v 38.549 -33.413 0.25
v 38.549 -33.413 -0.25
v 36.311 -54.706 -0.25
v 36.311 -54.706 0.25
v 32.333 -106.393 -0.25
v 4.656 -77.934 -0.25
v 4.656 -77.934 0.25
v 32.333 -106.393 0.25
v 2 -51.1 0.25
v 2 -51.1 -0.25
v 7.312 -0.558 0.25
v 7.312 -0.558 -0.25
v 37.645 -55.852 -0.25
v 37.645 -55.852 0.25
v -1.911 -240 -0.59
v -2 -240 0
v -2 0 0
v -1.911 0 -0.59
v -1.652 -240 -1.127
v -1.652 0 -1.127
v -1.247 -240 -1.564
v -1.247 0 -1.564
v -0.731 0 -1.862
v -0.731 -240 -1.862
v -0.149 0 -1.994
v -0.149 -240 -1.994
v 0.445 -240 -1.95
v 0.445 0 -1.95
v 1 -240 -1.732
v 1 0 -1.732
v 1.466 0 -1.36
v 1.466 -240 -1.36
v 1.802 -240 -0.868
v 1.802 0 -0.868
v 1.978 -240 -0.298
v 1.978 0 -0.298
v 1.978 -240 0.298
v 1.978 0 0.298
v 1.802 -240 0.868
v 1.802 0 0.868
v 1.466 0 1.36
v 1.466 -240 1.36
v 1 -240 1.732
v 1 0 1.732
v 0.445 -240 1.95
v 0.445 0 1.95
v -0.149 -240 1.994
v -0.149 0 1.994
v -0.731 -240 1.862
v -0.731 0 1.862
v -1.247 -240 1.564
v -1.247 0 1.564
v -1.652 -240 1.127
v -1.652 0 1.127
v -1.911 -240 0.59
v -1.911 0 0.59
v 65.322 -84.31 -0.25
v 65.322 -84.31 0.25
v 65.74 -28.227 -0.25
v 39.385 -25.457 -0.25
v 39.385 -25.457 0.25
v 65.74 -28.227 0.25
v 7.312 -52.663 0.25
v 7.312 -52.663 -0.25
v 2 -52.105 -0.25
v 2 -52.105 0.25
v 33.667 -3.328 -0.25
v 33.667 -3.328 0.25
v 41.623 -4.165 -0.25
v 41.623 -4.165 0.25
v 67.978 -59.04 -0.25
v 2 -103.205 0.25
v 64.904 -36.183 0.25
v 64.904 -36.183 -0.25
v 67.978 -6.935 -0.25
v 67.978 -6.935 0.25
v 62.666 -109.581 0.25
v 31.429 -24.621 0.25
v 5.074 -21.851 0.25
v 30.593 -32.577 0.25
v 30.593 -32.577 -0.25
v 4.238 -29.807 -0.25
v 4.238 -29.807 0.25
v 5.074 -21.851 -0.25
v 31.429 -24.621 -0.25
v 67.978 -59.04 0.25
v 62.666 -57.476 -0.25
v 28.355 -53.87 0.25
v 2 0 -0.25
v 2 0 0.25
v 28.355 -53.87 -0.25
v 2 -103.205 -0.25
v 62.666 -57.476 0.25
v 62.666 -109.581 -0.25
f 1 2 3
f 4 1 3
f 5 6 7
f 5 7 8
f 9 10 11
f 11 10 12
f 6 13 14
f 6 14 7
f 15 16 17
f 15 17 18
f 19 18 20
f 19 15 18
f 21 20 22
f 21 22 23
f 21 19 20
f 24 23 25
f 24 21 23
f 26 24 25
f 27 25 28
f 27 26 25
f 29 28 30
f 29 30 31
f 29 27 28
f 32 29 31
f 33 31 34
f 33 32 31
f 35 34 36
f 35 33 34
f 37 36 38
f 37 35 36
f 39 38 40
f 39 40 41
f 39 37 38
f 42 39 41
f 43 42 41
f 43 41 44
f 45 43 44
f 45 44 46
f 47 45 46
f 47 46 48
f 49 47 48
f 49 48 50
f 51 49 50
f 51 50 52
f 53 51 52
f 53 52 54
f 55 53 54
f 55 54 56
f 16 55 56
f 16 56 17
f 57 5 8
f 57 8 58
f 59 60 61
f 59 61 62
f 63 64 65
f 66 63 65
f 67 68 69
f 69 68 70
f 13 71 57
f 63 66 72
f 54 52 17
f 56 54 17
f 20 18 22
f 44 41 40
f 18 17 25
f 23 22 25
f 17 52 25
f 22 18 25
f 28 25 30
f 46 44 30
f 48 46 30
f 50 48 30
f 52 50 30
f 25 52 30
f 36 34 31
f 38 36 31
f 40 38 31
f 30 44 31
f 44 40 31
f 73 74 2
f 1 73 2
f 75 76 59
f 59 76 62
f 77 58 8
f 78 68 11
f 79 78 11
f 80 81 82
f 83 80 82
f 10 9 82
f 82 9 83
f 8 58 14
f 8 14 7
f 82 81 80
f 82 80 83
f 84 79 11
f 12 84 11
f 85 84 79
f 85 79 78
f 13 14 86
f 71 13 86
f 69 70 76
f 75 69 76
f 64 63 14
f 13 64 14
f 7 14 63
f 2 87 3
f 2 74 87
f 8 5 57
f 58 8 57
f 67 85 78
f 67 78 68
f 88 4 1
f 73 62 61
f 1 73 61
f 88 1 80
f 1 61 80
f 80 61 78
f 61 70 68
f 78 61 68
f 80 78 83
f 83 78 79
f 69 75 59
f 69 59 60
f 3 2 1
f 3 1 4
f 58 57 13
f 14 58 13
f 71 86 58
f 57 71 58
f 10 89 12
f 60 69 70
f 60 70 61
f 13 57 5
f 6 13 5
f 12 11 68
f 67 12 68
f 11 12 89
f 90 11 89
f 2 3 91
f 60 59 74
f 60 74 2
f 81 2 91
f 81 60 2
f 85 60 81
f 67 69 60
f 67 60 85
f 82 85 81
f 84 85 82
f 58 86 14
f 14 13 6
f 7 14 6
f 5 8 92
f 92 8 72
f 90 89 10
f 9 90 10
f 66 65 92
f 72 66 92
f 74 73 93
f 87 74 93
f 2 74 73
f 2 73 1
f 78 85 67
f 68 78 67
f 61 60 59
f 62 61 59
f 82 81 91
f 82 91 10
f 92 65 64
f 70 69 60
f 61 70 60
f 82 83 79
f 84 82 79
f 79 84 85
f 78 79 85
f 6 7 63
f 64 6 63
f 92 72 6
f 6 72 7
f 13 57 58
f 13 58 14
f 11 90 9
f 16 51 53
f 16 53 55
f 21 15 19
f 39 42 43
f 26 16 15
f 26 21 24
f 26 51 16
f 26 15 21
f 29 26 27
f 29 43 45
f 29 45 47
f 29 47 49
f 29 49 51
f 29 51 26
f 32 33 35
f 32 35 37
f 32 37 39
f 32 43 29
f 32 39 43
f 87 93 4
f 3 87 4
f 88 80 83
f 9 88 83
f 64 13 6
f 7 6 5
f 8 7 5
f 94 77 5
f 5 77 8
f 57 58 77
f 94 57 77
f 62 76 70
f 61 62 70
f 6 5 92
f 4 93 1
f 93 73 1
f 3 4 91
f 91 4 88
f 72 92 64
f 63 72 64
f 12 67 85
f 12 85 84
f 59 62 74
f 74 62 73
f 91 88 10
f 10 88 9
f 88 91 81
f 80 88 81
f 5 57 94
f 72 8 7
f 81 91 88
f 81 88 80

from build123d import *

# Parameters (mm, degrees)
BOSS_EXTRU_2_DEPTH             = 0.25
BOSS_EXTRU_2_2_DEPTH           = 0.25
FRACTIONNER1_START             = -0.25
FRACTIONNER1_DEPTH             = 0.5
FRACTIONNER1_2_DEPTH           = 0.5
FRACTIONNER1_START_2           = 7.435510802
FRACTIONNER1_3_OUTLINE_W       = 54
FRACTIONNER1_3_OUTLINE_H       = 4
FRACTIONNER1_3_DEPTH           = 5.341362776
FRACTIONNER1_START_3           = 1.989043791
FRACTIONNER1_4_OUTLINE_W       = 54
FRACTIONNER1_4_OUTLINE_H       = 4
FRACTIONNER1_4_DEPTH           = 5.341362776
FRACTIONNER2_SURFACE_1_1_BACK  = 128.911
FRACTIONNER2_SURFACE_1_1_DEPTH = 257.822
FRACTIONNER2_SURFACE_1_2_BACK  = 128.911
FRACTIONNER2_SURFACE_1_2_DEPTH = 257.822
FRACTIONNER2_SURFACE_2_3_BACK  = 128.911
FRACTIONNER2_SURFACE_2_3_DEPTH = 257.822
FRACTIONNER2_SURFACE_2_4_BACK  = 128.911
FRACTIONNER2_SURFACE_2_4_DEPTH = 257.822
FRACTIONNER2_SURFACE_3_5_BACK  = 128.911
FRACTIONNER2_SURFACE_3_5_DEPTH = 257.822
FRACTIONNER2_SURFACE_3_6_BACK  = 128.911
FRACTIONNER2_SURFACE_3_6_DEPTH = 257.822
FRACTIONNER2_SURFACE_4_7_BACK  = 128.911
FRACTIONNER2_SURFACE_4_7_DEPTH = 257.822
FRACTIONNER2_SURFACE_4_8_BACK  = 128.911
FRACTIONNER2_SURFACE_4_8_DEPTH = 257.822
FRACTIONNER3_SURFACE_9_BACK    = 128.911
FRACTIONNER3_SURFACE_9_DEPTH   = 257.822
FRACTIONNER3_SURFACE_10_BACK   = 128.911
FRACTIONNER3_SURFACE_10_DEPTH  = 257.822
BALAYAGE2_PROFILE_R            = 2


# Read off the part's stored shape, not the designer's step: Fractionner1
with BuildPart() as part:
    # Esquisse2 → Boss.-Extru.2 (new, symmetric)
    with BuildSketch(Plane.XY):
        Polygon((2, 0), (67.977937849, -6.934560702), (62.665835617, -57.475837352), (2, -51.099601093), align=None)
    extrude(amount=BOSS_EXTRU_2_DEPTH, both=True)

    # Fractionner1 4 outline → Fractionner1 4 (cut)
    with BuildSketch(Plane(origin=(0, 0, 0), x_dir=(0.10452846326764997, 0.9945218953682736, 0), z_dir=(0.9945218953682737, -0.10452846326764997, 0)).offset(FRACTIONNER1_START_3)):
        with Locations((-25, 0)):
            Rectangle(FRACTIONNER1_4_OUTLINE_W, FRACTIONNER1_4_OUTLINE_H)
    extrude(amount=FRACTIONNER1_4_DEPTH, mode=Mode.SUBTRACT)


with BuildPart() as body_2:
    # Esquisse2 → Boss.-Extru.2 2 (new, symmetric)
    with BuildSketch(Plane.XY):
        Polygon((2, -52.105109372), (67.977937849, -59.039670074), (62.665835617, -109.580946724), (2, -103.204710465), align=None)
    extrude(amount=BOSS_EXTRU_2_2_DEPTH, both=True)

    # Fractionner1 3 outline → Fractionner1 3 (cut)
    with BuildSketch(Plane(origin=(0, 0, 0), x_dir=(0.10452846326764997, 0.9945218953682736, 0), z_dir=(0.9945218953682737, -0.10452846326764997, 0)).offset(FRACTIONNER1_START_2)):
        with Locations((-77, 0)):
            Rectangle(FRACTIONNER1_3_OUTLINE_W, FRACTIONNER1_3_OUTLINE_H)
    extrude(amount=FRACTIONNER1_3_DEPTH, mode=Mode.SUBTRACT)


with BuildPart() as body_3:
    # Fractionner1 outline → Fractionner1 (new body)
    with BuildSketch(Plane.XY.offset(FRACTIONNER1_START)):
        Polygon((2, -51.099601093), (7.312102232, -0.558324443), (2, 0), align=None)
    extrude(amount=FRACTIONNER1_DEPTH)


with BuildPart() as body_4:
    # Fractionner1 2 outline → Fractionner1 2 (new body)
    with BuildSketch(Plane.XY.offset(FRACTIONNER1_START)):
        Polygon((2, -103.204710465), (7.312102232, -52.663433815), (2, -52.105109372), align=None)
    extrude(amount=FRACTIONNER1_2_DEPTH)


with BuildPart() as body_5:
    # Fractionner2: the piece behind the surface
    add(part.part)
    # Fractionner2 surface 1: a surface, the sketch's curves swept straight by 257.822 mm
    with BuildLine(Plane.XY.offset(0.25).offset(-FRACTIONNER2_SURFACE_1_1_BACK), mode=Mode.PRIVATE) as fractionner2_surface_1_1_path:
        Line((5.074164969, -21.850875186), (31.428995196, -24.620879463))
        Line((31.428995196, -24.620879463), (33.666932459, -3.328328719))
    fractionner2_surface_1_1 = Shell.extrude(fractionner2_surface_1_1_path.wire(), (0 * FRACTIONNER2_SURFACE_1_1_DEPTH, 0 * FRACTIONNER2_SURFACE_1_1_DEPTH, 1 * FRACTIONNER2_SURFACE_1_1_DEPTH))
    split(bisect_by=fractionner2_surface_1_1, keep=Keep.BOTTOM)


with BuildPart() as part_1:
    add(part.part)

    # Fractionner2: split by a surface, the side it looks to stays
    # Fractionner2 surface 1: a surface, the sketch's curves swept straight by 257.822 mm
    with BuildLine(Plane.XY.offset(0.25).offset(-FRACTIONNER2_SURFACE_1_2_BACK), mode=Mode.PRIVATE) as fractionner2_surface_1_2_path:
        Line((5.074164969, -21.850875186), (31.428995196, -24.620879463))
        Line((31.428995196, -24.620879463), (33.666932459, -3.328328719))
    fractionner2_surface_1_2 = Shell.extrude(fractionner2_surface_1_2_path.wire(), (0 * FRACTIONNER2_SURFACE_1_2_DEPTH, 0 * FRACTIONNER2_SURFACE_1_2_DEPTH, 1 * FRACTIONNER2_SURFACE_1_2_DEPTH))
    split(bisect_by=fractionner2_surface_1_2, keep=Keep.TOP)


with BuildPart() as body_6:
    # Fractionner2 2 body 5: the piece behind the surface
    add(body_5.part)
    # Fractionner2 surface 2: a surface, the sketch's curves swept straight by 257.822 mm
    with BuildLine(Plane.XY.offset(0.25).offset(-FRACTIONNER2_SURFACE_2_3_BACK), mode=Mode.PRIVATE) as fractionner2_surface_2_3_path:
        Line((41.623107622, -4.164556425), (39.385170359, -25.457107169))
        Line((39.385170359, -25.457107169), (65.740000586, -28.227111445))
    fractionner2_surface_2_3 = Shell.extrude(fractionner2_surface_2_3_path.wire(), (0 * FRACTIONNER2_SURFACE_2_3_DEPTH, 0 * FRACTIONNER2_SURFACE_2_3_DEPTH, 1 * FRACTIONNER2_SURFACE_2_3_DEPTH))
    split(bisect_by=fractionner2_surface_2_3, keep=Keep.BOTTOM)


with BuildPart() as body_5_1:
    add(body_5.part)

    # Fractionner2 2 body 5: split by a surface, the side it looks to stays
    # Fractionner2 surface 2: a surface, the sketch's curves swept straight by 257.822 mm
    with BuildLine(Plane.XY.offset(0.25).offset(-FRACTIONNER2_SURFACE_2_4_BACK), mode=Mode.PRIVATE) as fractionner2_surface_2_4_path:
        Line((41.623107622, -4.164556425), (39.385170359, -25.457107169))
        Line((39.385170359, -25.457107169), (65.740000586, -28.227111445))
    fractionner2_surface_2_4 = Shell.extrude(fractionner2_surface_2_4_path.wire(), (0 * FRACTIONNER2_SURFACE_2_4_DEPTH, 0 * FRACTIONNER2_SURFACE_2_4_DEPTH, 1 * FRACTIONNER2_SURFACE_2_4_DEPTH))
    split(bisect_by=fractionner2_surface_2_4, keep=Keep.TOP)


with BuildPart() as body_7:
    # Fractionner2 3 body 6: the piece behind the surface
    add(body_6.part)
    # Fractionner2 surface 3: a surface, the sketch's curves swept straight by 257.822 mm
    with BuildLine(Plane.XY.offset(0.25).offset(-FRACTIONNER2_SURFACE_3_5_BACK), mode=Mode.PRIVATE) as fractionner2_surface_3_5_path:
        Line((64.90377288, -36.183286608), (38.548942653, -33.413282332))
        Line((38.548942653, -33.413282332), (36.31100539, -54.705833075))
    fractionner2_surface_3_5 = Shell.extrude(fractionner2_surface_3_5_path.wire(), (0 * FRACTIONNER2_SURFACE_3_5_DEPTH, 0 * FRACTIONNER2_SURFACE_3_5_DEPTH, 1 * FRACTIONNER2_SURFACE_3_5_DEPTH))
    split(bisect_by=fractionner2_surface_3_5, keep=Keep.BOTTOM)


with BuildPart() as body_6_1:
    add(body_6.part)

    # Fractionner2 3 body 6: split by a surface, the side it looks to stays
    # Fractionner2 surface 3: a surface, the sketch's curves swept straight by 257.822 mm
    with BuildLine(Plane.XY.offset(0.25).offset(-FRACTIONNER2_SURFACE_3_6_BACK), mode=Mode.PRIVATE) as fractionner2_surface_3_6_path:
        Line((64.90377288, -36.183286608), (38.548942653, -33.413282332))
        Line((38.548942653, -33.413282332), (36.31100539, -54.705833075))
    fractionner2_surface_3_6 = Shell.extrude(fractionner2_surface_3_6_path.wire(), (0 * FRACTIONNER2_SURFACE_3_6_DEPTH, 0 * FRACTIONNER2_SURFACE_3_6_DEPTH, 1 * FRACTIONNER2_SURFACE_3_6_DEPTH))
    split(bisect_by=fractionner2_surface_3_6, keep=Keep.TOP)


with BuildPart() as body_8:
    # Fractionner2 4 body 7: the piece behind the surface
    add(body_7.part)
    # Fractionner2 surface 4: a surface, the sketch's curves swept straight by 257.822 mm
    with BuildLine(Plane.XY.offset(0.25).offset(-FRACTIONNER2_SURFACE_4_7_BACK), mode=Mode.PRIVATE) as fractionner2_surface_4_7_path:
        Line((28.354830227, -53.869605369), (30.59276749, -32.577054626))
        Line((30.59276749, -32.577054626), (4.237937263, -29.807050349))
    fractionner2_surface_4_7 = Shell.extrude(fractionner2_surface_4_7_path.wire(), (0 * FRACTIONNER2_SURFACE_4_7_DEPTH, 0 * FRACTIONNER2_SURFACE_4_7_DEPTH, 1 * FRACTIONNER2_SURFACE_4_7_DEPTH))
    split(bisect_by=fractionner2_surface_4_7, keep=Keep.BOTTOM)


with BuildPart() as body_7_1:
    add(body_7.part)

    # Fractionner2 4 body 7: split by a surface, the side it looks to stays
    # Fractionner2 surface 4: a surface, the sketch's curves swept straight by 257.822 mm
    with BuildLine(Plane.XY.offset(0.25).offset(-FRACTIONNER2_SURFACE_4_8_BACK), mode=Mode.PRIVATE) as fractionner2_surface_4_8_path:
        Line((28.354830227, -53.869605369), (30.59276749, -32.577054626))
        Line((30.59276749, -32.577054626), (4.237937263, -29.807050349))
    fractionner2_surface_4_8 = Shell.extrude(fractionner2_surface_4_8_path.wire(), (0 * FRACTIONNER2_SURFACE_4_8_DEPTH, 0 * FRACTIONNER2_SURFACE_4_8_DEPTH, 1 * FRACTIONNER2_SURFACE_4_8_DEPTH))
    split(bisect_by=fractionner2_surface_4_8, keep=Keep.TOP)


with BuildPart() as body_9:
    # Fractionner3: the piece behind the surface
    add(body_2.part)
    # Fractionner3 surface: a surface, the sketch's curves swept straight by 257.822 mm
    with BuildLine(Plane.XY.offset(0.25).offset(-FRACTIONNER3_SURFACE_9_BACK), mode=Mode.PRIVATE) as fractionner3_surface_9_path:
        Line((37.64502004, -55.851551945), (4.656051116, -77.93407214))
        Line((4.656051116, -77.93407214), (32.332917809, -106.392828594))
        Line((32.332917809, -106.392828594), (65.321886733, -84.310308399))
        Line((65.321886733, -84.310308399), (37.64502004, -55.851551945))
    fractionner3_surface_9 = Shell.extrude(fractionner3_surface_9_path.wire(), (0 * FRACTIONNER3_SURFACE_9_DEPTH, 0 * FRACTIONNER3_SURFACE_9_DEPTH, 1 * FRACTIONNER3_SURFACE_9_DEPTH))
    split(bisect_by=fractionner3_surface_9, keep=Keep.BOTTOM)


with BuildPart() as body_2_1:
    add(body_2.part)

    # Fractionner3: split by a surface, the side it looks to stays
    # Fractionner3 surface: a surface, the sketch's curves swept straight by 257.822 mm
    with BuildLine(Plane.XY.offset(0.25).offset(-FRACTIONNER3_SURFACE_10_BACK), mode=Mode.PRIVATE) as fractionner3_surface_10_path:
        Line((37.64502004, -55.851551945), (4.656051116, -77.93407214))
        Line((4.656051116, -77.93407214), (32.332917809, -106.392828594))
        Line((32.332917809, -106.392828594), (65.321886733, -84.310308399))
        Line((65.321886733, -84.310308399), (37.64502004, -55.851551945))
    fractionner3_surface_10 = Shell.extrude(fractionner3_surface_10_path.wire(), (0 * FRACTIONNER3_SURFACE_10_DEPTH, 0 * FRACTIONNER3_SURFACE_10_DEPTH, 1 * FRACTIONNER3_SURFACE_10_DEPTH))
    split(bisect_by=fractionner3_surface_10, keep=Keep.TOP)


with BuildPart() as body_10:
    # Balayage2: sweep along a path in Esquisse7
    with BuildLine(Plane.XY) as balayage2_path:
        Line((0, 0), (0, -240))
    # Balayage2 profile (on start of the path) → Balayage2 (sweep)
    with BuildSketch(Plane(origin=(0, 0, 0), x_dir=(-1, 0, 0), z_dir=(0, -1, 0))):
        Circle(BALAYAGE2_PROFILE_R)
    sweep(path=balayage2_path.line)


solid = Compound([body_3.part, body_4.part, part_1.part, body_5_1.part, body_6_1.part, body_8.part, body_7_1.part, body_9.part, body_2_1.part, body_10.part])
